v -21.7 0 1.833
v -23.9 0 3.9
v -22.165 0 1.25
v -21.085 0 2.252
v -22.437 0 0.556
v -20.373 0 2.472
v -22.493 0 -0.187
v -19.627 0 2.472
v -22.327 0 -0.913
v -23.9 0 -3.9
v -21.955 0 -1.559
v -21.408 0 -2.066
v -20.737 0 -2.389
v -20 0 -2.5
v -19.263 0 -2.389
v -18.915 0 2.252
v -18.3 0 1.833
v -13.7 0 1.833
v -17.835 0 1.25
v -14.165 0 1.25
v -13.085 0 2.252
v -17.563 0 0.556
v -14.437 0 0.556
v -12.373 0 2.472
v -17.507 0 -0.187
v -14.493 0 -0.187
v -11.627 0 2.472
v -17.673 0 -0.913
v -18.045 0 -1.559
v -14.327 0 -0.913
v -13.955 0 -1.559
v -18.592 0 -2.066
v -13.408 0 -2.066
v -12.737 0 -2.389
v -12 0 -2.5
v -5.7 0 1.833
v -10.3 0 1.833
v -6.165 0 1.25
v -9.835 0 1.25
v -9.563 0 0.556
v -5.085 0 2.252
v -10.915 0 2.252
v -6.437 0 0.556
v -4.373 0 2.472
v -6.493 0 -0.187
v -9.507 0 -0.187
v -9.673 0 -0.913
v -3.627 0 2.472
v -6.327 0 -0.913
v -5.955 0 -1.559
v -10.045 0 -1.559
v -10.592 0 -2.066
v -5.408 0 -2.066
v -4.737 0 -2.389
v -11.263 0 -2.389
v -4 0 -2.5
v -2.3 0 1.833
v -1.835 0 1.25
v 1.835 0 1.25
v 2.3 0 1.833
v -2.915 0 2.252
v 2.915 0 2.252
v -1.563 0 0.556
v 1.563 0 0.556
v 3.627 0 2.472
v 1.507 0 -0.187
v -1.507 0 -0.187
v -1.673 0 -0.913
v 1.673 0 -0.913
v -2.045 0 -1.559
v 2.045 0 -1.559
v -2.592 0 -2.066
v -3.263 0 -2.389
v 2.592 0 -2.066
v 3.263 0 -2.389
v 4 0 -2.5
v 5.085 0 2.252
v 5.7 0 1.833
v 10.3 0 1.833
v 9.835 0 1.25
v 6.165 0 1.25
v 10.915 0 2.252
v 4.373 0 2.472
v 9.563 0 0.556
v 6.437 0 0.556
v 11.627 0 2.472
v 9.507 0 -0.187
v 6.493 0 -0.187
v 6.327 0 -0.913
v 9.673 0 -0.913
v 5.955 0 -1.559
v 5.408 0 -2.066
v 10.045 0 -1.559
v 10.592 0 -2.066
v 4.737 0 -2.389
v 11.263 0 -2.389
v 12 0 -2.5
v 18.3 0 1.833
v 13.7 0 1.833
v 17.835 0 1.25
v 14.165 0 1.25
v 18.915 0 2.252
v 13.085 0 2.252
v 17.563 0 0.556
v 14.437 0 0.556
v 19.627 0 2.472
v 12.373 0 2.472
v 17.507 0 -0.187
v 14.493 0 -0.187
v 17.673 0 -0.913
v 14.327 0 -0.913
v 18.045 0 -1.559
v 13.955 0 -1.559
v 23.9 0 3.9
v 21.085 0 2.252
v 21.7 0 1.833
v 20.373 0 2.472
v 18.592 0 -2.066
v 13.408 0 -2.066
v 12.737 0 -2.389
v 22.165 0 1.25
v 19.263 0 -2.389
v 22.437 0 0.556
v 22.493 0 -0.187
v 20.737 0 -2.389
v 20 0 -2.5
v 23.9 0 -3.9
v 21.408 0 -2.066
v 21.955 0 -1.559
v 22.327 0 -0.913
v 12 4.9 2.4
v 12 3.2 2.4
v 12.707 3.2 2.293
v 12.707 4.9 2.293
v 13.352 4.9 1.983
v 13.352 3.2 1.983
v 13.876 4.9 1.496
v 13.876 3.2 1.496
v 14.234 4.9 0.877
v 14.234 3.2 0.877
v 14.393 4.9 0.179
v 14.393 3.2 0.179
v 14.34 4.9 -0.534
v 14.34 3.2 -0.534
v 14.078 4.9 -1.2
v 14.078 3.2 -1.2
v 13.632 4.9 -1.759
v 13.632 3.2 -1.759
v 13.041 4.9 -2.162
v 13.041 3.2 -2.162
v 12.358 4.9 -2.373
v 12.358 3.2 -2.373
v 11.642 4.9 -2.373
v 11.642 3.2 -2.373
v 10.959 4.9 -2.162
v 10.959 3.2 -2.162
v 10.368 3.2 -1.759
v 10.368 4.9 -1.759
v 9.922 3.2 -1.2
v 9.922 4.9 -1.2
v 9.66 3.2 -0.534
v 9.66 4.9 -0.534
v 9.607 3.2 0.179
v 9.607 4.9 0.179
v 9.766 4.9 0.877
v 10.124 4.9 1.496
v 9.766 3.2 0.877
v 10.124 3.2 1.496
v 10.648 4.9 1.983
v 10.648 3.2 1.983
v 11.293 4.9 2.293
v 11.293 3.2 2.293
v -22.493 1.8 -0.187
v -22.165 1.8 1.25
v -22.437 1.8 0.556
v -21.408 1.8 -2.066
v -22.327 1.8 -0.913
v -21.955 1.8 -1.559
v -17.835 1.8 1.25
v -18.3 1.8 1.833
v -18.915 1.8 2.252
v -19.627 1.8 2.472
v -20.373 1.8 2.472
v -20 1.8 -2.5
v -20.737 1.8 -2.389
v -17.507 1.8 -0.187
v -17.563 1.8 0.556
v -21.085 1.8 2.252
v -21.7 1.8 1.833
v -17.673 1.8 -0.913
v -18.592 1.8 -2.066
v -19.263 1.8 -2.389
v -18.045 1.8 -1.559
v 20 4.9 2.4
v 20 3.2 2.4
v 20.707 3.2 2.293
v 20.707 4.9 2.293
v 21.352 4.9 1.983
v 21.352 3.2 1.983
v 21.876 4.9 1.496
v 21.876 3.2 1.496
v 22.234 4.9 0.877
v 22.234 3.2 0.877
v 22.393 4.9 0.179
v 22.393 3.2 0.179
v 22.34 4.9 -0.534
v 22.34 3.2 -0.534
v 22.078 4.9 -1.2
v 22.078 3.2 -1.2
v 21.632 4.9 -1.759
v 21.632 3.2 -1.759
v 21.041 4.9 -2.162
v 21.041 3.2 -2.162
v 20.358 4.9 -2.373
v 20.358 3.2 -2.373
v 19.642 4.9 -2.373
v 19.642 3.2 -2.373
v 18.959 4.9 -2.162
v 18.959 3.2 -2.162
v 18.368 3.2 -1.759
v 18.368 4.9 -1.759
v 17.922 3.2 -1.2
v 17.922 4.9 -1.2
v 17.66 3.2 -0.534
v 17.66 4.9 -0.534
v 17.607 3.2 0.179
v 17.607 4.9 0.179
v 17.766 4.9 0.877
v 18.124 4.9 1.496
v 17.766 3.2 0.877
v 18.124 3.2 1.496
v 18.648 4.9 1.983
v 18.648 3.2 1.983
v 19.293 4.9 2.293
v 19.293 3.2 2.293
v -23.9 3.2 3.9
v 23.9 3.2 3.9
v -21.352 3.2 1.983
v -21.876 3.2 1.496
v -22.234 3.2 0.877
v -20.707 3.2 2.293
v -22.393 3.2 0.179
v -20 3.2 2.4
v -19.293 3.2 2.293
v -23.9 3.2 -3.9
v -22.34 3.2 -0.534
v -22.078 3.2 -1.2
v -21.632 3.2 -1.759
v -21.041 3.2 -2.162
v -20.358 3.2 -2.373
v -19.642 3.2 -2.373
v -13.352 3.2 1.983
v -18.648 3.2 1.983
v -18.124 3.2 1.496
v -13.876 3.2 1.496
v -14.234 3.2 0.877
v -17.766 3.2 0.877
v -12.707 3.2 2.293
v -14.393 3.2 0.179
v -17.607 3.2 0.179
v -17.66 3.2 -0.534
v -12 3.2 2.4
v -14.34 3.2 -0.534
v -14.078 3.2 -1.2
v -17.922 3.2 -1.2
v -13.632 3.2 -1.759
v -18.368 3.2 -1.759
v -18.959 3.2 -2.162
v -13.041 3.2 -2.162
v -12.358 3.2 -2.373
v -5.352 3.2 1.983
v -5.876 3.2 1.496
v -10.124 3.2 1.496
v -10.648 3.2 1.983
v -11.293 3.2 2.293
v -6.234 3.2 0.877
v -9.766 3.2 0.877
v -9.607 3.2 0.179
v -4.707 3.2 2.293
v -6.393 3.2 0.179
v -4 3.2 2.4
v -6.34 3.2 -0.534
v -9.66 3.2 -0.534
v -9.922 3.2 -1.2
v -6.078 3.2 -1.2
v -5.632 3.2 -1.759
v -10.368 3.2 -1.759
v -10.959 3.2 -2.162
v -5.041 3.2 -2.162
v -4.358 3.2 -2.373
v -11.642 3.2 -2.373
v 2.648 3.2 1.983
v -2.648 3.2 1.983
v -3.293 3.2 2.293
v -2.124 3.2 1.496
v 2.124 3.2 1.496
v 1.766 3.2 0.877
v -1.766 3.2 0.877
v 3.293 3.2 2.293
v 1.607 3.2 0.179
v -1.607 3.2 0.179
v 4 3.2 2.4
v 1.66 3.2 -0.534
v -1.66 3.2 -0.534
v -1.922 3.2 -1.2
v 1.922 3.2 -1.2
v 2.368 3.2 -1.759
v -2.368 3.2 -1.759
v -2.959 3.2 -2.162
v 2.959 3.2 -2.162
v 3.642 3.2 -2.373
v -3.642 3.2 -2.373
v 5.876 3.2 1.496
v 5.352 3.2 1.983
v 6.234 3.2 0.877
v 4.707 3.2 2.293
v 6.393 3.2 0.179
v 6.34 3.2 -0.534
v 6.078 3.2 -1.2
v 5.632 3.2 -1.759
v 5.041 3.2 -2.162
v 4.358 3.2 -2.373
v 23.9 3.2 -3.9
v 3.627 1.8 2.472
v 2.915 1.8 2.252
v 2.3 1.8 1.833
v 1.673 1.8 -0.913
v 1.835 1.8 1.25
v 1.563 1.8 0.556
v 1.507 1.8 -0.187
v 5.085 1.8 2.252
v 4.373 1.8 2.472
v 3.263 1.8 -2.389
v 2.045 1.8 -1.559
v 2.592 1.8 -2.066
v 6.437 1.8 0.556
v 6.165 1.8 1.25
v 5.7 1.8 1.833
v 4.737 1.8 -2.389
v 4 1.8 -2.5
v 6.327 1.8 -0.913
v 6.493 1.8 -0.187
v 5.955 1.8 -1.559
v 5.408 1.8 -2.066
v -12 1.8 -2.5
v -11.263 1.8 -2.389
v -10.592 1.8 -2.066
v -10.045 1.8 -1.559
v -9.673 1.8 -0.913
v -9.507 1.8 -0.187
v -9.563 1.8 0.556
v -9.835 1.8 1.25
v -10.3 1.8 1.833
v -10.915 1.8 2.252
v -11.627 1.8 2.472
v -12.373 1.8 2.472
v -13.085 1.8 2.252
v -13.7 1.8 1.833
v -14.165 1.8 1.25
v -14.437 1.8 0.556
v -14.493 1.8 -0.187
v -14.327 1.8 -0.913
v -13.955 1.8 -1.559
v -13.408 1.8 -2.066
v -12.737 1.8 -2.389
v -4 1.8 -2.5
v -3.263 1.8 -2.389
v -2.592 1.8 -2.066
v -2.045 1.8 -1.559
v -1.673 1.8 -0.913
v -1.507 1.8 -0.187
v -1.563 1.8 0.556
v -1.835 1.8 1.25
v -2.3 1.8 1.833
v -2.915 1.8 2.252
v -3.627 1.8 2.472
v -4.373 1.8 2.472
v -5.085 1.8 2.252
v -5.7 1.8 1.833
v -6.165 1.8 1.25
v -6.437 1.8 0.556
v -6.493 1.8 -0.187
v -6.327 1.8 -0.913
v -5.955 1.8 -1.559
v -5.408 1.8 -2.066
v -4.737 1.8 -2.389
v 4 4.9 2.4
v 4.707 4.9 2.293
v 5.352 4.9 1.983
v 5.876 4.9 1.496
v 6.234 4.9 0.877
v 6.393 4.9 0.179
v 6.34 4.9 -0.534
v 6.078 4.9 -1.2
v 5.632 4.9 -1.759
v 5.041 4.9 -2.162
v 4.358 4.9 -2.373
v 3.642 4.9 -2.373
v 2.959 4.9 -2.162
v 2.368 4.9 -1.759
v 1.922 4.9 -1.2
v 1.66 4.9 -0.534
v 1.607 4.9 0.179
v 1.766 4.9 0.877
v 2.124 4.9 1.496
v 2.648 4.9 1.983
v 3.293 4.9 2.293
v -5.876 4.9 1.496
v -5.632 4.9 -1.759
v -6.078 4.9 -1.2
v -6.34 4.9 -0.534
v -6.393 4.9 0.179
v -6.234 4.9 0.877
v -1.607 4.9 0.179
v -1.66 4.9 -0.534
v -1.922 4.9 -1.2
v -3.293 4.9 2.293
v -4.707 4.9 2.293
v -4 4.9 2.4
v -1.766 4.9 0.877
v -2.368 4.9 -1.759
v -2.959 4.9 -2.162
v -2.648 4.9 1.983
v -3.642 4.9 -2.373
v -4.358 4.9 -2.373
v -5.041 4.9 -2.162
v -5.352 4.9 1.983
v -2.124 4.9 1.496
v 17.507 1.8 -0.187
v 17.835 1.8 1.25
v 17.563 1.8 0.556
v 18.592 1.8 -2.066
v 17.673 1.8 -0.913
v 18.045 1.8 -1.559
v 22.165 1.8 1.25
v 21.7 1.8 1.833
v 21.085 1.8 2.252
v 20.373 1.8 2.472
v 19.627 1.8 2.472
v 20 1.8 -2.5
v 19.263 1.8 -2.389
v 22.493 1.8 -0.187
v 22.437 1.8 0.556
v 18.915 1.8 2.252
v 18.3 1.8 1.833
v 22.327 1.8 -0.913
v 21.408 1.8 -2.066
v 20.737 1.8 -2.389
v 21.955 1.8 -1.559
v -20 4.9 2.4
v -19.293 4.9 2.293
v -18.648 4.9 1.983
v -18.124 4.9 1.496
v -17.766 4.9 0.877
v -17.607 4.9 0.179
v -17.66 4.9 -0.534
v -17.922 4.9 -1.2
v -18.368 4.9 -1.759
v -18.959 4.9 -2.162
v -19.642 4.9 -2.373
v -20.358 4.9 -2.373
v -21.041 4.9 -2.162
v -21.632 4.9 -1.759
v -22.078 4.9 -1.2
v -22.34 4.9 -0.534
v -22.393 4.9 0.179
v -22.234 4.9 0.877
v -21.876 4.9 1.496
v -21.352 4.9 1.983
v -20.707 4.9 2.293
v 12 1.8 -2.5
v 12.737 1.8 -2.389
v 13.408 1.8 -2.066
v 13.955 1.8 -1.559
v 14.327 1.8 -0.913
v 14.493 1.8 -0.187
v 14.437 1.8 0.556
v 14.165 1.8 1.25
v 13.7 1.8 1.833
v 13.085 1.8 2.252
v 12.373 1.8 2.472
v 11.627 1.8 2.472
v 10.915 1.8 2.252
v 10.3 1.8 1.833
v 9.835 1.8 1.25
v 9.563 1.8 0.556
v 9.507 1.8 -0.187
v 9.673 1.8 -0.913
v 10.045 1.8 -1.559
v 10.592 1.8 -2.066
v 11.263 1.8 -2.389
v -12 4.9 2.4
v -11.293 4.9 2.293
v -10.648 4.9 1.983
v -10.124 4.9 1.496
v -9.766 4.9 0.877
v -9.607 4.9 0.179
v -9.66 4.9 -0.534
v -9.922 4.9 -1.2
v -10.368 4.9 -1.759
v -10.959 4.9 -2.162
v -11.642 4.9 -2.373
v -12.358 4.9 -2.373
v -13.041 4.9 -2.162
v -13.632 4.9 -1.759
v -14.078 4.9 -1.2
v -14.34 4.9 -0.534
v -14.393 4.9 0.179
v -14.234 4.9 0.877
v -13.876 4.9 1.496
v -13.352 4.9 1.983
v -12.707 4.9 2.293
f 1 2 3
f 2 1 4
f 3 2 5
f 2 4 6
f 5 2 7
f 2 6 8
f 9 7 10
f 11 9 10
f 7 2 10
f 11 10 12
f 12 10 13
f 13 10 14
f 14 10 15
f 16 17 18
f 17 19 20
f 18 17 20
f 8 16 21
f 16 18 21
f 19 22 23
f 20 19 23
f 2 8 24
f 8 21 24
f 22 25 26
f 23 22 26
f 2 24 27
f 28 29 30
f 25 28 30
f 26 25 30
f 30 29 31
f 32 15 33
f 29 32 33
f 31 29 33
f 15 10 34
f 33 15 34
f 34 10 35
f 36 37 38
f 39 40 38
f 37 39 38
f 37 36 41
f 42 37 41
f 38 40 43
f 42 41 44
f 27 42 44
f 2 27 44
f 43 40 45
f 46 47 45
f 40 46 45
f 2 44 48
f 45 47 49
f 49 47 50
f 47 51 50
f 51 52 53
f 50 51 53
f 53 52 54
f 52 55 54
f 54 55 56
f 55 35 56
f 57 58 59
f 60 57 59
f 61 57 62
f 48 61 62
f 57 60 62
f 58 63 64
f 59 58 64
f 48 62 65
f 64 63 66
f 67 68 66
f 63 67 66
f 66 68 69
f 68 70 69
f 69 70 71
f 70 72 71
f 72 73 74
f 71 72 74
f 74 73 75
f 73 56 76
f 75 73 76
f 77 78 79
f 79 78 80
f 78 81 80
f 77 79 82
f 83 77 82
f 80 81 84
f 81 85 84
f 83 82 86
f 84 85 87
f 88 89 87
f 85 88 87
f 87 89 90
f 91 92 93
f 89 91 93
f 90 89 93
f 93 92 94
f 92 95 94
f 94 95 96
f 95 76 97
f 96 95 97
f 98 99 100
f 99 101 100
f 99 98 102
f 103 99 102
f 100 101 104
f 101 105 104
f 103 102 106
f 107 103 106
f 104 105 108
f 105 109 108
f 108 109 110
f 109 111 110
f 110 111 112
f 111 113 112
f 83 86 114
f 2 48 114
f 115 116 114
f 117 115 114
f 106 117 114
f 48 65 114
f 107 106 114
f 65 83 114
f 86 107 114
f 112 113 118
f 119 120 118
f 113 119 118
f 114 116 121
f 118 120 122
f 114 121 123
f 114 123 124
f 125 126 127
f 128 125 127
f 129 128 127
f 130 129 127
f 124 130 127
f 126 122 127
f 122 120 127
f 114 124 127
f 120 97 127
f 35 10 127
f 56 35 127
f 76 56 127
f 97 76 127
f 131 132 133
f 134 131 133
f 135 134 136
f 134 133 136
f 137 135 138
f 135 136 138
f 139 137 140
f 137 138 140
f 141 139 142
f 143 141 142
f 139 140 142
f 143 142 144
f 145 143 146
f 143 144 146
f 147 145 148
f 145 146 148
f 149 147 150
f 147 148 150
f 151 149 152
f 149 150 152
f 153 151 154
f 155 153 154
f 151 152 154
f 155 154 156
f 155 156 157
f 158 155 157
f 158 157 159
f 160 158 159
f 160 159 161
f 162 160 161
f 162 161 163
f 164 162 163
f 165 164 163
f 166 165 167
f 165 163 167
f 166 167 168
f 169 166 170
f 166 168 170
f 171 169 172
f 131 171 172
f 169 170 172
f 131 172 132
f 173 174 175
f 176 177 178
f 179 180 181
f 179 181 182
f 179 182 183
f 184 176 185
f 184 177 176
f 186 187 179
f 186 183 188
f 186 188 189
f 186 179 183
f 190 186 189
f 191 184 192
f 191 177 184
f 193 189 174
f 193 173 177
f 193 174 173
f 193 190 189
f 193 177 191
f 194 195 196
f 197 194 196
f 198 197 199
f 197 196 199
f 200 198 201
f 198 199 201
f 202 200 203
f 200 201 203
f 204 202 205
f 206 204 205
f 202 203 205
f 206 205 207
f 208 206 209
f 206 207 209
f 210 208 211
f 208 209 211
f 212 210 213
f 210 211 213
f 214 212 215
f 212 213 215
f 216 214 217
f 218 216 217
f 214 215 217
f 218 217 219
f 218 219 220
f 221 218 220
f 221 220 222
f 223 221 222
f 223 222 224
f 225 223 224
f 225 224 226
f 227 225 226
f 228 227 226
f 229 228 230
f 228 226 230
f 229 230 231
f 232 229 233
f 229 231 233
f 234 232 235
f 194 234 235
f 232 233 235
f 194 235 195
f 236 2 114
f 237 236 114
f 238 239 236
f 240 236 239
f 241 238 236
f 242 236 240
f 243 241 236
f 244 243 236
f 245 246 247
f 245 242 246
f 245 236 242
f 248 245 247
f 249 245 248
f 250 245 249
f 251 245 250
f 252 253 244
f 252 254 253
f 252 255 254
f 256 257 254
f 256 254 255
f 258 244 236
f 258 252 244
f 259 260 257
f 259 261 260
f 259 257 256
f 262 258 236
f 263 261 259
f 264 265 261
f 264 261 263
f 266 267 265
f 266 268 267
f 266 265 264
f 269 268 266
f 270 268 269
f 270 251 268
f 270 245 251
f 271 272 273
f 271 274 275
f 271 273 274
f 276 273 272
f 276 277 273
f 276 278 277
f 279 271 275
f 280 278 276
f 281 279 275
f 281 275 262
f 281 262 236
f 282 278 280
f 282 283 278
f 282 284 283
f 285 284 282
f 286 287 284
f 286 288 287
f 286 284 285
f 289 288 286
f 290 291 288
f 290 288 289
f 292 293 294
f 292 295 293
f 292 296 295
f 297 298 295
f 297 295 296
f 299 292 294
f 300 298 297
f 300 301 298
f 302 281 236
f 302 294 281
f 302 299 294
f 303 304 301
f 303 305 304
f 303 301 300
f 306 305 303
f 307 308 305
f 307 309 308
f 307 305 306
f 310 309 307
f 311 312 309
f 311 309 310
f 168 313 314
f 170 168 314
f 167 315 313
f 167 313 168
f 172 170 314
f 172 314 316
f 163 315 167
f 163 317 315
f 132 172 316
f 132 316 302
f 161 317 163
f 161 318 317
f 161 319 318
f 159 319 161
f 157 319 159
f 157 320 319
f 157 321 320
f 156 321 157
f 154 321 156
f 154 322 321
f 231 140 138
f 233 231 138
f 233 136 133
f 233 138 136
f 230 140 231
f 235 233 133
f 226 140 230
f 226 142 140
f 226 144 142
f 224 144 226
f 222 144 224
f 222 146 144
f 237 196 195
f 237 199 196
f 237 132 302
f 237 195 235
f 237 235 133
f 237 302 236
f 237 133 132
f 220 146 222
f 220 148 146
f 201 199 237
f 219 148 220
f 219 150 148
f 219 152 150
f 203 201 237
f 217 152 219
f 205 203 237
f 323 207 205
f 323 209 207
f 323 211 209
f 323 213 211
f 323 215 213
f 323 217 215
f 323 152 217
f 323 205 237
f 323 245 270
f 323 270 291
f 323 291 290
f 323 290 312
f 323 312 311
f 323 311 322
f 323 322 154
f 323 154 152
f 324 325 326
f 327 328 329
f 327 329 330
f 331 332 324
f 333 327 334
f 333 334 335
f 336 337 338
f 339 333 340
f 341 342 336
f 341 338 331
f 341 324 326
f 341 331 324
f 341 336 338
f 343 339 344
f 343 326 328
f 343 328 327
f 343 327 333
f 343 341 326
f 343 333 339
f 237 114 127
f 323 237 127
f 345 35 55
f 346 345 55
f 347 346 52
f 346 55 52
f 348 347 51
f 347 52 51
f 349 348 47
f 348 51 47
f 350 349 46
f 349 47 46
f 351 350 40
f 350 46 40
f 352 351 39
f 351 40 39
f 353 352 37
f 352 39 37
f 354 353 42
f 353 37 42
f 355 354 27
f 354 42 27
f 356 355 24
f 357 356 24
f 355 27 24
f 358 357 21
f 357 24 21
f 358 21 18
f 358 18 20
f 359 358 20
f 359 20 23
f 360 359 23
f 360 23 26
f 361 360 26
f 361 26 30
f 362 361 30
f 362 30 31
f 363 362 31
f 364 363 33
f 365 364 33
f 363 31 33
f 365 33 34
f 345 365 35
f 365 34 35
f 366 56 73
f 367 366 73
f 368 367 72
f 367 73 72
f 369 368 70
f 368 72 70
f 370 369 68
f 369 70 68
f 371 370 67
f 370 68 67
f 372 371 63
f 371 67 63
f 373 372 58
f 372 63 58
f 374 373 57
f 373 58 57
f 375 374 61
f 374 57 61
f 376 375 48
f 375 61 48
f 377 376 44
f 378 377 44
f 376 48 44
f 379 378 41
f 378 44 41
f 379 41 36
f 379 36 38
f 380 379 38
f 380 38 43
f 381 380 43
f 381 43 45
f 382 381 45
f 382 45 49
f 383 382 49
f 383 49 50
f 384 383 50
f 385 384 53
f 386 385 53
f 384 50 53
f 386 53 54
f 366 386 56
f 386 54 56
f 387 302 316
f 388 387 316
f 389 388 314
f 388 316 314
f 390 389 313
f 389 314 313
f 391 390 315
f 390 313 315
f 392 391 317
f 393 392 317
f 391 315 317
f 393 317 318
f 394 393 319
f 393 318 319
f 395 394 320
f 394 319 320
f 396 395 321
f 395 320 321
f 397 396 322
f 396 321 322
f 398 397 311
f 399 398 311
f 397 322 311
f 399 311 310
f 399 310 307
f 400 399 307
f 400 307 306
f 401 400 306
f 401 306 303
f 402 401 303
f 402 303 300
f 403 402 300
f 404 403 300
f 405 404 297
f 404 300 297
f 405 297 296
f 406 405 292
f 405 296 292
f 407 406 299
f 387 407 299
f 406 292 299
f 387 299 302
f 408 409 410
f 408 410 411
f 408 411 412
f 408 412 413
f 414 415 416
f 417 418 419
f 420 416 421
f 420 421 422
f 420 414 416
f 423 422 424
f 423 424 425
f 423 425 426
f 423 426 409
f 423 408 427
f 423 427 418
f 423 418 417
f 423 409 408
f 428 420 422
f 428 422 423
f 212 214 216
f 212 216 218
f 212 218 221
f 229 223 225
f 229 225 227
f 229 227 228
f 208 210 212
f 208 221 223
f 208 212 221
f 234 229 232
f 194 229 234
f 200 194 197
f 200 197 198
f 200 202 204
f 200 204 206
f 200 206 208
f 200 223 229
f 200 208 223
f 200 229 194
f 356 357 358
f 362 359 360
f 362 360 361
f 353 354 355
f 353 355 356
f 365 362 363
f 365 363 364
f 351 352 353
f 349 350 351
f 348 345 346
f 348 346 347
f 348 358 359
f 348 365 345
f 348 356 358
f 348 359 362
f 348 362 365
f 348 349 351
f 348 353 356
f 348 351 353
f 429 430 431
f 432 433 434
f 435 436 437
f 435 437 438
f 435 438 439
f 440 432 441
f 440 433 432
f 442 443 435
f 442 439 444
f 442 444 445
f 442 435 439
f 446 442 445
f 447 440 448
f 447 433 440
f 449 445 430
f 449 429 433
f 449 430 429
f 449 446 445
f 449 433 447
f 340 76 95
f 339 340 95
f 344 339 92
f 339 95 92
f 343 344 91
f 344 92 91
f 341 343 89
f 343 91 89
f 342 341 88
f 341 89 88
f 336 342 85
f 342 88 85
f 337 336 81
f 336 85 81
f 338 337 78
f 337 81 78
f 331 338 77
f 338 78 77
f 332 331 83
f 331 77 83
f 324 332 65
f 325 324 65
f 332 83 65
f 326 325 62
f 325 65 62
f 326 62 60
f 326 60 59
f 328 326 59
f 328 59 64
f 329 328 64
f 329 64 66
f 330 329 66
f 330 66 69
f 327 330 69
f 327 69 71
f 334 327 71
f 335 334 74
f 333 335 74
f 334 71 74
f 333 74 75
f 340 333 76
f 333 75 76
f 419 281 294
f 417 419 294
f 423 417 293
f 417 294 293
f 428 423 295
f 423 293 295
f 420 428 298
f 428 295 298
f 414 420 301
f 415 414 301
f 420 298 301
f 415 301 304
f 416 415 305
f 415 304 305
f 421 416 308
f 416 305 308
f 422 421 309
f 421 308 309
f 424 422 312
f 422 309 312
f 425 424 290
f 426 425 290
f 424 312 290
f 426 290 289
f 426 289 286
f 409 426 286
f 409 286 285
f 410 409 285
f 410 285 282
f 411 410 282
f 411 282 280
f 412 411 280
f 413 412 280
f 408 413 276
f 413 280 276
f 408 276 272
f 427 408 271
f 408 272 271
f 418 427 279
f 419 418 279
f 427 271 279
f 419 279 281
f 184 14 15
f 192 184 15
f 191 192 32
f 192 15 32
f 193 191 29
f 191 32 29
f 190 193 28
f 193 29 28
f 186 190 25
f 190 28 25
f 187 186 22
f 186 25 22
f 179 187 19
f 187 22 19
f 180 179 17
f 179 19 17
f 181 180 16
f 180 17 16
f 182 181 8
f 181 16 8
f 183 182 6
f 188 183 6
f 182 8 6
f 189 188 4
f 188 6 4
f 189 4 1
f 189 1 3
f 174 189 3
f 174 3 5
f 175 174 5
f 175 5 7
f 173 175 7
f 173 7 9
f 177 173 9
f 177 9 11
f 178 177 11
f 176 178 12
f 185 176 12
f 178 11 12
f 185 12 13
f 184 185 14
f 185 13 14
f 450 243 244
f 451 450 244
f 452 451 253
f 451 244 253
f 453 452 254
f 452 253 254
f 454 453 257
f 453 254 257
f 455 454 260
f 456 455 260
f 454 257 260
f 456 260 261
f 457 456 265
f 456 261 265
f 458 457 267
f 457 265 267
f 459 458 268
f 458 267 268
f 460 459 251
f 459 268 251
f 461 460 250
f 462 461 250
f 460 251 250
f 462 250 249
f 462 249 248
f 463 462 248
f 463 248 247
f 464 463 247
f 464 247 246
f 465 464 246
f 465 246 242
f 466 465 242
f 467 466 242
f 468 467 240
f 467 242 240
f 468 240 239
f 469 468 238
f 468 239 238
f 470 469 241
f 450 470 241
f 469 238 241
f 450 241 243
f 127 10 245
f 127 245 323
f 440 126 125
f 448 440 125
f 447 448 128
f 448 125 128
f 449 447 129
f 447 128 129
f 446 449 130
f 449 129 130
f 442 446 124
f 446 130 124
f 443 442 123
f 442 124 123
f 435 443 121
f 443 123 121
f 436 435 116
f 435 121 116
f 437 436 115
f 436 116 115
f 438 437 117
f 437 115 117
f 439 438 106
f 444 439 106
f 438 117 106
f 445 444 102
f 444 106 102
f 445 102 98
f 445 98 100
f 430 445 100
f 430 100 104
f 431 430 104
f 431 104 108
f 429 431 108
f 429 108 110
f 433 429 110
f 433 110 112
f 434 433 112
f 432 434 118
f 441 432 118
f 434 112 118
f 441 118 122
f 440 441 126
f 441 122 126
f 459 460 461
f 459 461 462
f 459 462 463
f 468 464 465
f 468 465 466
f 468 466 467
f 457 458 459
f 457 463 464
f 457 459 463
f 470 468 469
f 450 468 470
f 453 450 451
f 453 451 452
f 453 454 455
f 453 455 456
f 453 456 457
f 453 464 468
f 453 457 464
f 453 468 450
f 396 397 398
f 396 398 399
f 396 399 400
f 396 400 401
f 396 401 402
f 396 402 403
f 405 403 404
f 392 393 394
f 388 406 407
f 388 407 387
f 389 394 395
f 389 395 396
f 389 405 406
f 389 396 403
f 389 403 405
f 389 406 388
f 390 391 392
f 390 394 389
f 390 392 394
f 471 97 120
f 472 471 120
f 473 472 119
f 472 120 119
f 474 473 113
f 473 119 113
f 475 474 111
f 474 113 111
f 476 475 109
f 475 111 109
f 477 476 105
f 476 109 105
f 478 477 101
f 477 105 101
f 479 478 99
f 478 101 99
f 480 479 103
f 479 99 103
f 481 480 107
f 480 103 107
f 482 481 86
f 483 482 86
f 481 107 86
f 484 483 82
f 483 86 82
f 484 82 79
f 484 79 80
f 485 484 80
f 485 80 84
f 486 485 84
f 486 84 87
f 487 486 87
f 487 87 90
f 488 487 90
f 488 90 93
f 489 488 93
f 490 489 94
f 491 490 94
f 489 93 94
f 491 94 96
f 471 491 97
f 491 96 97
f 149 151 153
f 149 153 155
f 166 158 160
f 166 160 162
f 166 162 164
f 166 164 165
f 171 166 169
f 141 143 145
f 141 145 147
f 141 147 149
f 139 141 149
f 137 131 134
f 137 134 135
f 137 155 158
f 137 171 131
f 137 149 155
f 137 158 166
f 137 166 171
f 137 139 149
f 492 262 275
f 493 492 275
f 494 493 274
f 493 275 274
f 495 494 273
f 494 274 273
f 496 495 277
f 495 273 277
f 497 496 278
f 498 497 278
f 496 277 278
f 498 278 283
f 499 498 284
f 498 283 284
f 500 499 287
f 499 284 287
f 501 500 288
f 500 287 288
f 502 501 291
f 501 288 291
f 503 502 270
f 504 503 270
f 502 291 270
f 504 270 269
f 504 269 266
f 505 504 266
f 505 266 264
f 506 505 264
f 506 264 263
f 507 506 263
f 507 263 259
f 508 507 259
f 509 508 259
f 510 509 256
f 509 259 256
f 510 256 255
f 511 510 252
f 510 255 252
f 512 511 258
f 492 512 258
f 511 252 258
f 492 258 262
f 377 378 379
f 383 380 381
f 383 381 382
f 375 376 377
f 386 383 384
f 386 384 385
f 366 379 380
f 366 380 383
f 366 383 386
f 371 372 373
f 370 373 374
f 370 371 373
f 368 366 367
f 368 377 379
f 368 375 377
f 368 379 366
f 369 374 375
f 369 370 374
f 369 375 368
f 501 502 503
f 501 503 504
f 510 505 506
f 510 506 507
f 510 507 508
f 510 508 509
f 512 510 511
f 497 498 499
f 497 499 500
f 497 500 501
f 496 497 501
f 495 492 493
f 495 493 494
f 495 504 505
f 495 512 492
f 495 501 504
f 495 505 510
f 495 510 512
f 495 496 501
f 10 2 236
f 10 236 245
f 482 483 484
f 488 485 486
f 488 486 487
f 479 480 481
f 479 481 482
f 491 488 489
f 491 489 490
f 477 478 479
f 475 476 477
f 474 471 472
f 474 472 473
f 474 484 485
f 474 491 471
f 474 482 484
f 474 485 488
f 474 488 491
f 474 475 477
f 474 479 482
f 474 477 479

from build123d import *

# Parameters (mm, degrees)
SKETCH_1_W          = 47.8
SKETCH_1_H          = 7.8
EXTRUDE_1_DEPTH     = 3.2
SKETCH_2_R          = 2.4
EXTRUDE_2_DEPTH     = 1.7
SKETCH_3_R          = 2.5
CUT_EXTRUDE_1_DEPTH = 1.8


with BuildPart() as part:
    # Эскиз1 → Бобышка-Вытянуть1 (new body)
    with BuildSketch(Plane(origin=(0, 0, 0), x_dir=(1, 0, 0), z_dir=(0, 1, 0))):
        Rectangle(SKETCH_1_W, SKETCH_1_H)
    extrude(amount=EXTRUDE_1_DEPTH)

    # Эскиз2 → Бобышка-Вытянуть2 (add)
    with BuildSketch(Plane(origin=(0, 3.2, 0), x_dir=(1, 0, 0), z_dir=(0, 1, 0))):
        with Locations(Location((-20, 0, 0), (0, 0, 270))):
            Circle(SKETCH_2_R)
        with Locations(Location((-12, 0, 0), (0, 0, 270))):
            Circle(SKETCH_2_R)
        with Locations(Location((-4, 0, 0), (0, 0, 270))):
            Circle(SKETCH_2_R)
        with Locations(Location((4, 0, 0), (0, 0, 270))):
            Circle(SKETCH_2_R)
        with Locations(Location((12, 0, 0), (0, 0, 270))):
            Circle(SKETCH_2_R)
        with Locations(Location((20, 0, 0), (0, 0, 270))):
            Circle(SKETCH_2_R)
    extrude(amount=EXTRUDE_2_DEPTH)

    # Эскиз3 → Вырез-Вытянуть1 (cut)
    with BuildSketch(Plane.XZ):
        with Locations(Location((-20, 0, 0), (0, 0, 270))):
            Circle(SKETCH_3_R)
        with Locations(Location((-12, 0, 0), (0, 0, 270))):
            Circle(SKETCH_3_R)
        with Locations(Location((-4, 0, 0), (0, 0, 270))):
            Circle(SKETCH_3_R)
        with Locations(Location((4, 0, 0), (0, 0, 270))):
            Circle(SKETCH_3_R)
        with Locations(Location((12, 0, 0), (0, 0, 270))):
            Circle(SKETCH_3_R)
        with Locations(Location((20, 0, 0), (0, 0, 270))):
            Circle(SKETCH_3_R)
    extrude(amount=-CUT_EXTRUDE_1_DEPTH, mode=Mode.SUBTRACT)


solid = part.part
